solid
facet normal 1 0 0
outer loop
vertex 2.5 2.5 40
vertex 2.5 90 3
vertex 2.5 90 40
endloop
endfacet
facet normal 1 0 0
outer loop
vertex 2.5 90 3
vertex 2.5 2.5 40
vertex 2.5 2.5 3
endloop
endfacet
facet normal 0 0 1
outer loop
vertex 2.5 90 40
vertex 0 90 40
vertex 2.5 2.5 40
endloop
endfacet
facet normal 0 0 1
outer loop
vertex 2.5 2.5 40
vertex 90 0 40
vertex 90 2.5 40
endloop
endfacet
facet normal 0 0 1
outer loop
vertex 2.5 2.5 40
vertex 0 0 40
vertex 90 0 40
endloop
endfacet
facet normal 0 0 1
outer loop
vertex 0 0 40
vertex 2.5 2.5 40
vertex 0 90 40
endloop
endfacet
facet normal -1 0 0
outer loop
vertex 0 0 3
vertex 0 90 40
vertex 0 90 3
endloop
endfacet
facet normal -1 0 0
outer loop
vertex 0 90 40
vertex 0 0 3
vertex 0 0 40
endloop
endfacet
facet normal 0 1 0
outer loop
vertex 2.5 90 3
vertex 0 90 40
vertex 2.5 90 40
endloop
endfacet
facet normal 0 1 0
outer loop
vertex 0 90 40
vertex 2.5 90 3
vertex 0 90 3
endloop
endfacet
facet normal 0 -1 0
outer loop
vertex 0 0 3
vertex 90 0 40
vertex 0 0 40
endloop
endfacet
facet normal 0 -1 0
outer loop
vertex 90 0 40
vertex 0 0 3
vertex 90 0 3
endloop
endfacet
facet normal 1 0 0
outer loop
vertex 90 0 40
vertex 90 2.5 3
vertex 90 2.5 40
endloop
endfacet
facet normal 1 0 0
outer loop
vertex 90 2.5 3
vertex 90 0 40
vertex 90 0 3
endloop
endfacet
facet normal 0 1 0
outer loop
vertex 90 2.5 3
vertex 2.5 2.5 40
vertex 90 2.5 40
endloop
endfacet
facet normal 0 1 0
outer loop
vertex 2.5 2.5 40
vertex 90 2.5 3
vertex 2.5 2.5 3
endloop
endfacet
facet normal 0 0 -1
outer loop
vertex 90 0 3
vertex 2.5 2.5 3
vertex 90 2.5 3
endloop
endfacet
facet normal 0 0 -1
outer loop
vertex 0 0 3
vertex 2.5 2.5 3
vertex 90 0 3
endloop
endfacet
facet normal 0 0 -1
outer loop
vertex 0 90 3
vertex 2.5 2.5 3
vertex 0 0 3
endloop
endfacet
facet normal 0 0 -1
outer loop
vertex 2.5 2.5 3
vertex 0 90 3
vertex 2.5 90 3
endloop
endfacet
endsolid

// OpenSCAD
// Magnetic stirrer housing - an open box (a plate with four walls) that covers a PC case fan
// to turn it into a stir plate. The top plate is the stirring surface. NOVEL general part.
//

top    = 90;
length = 90;
height = 40;
wall   = 2.5;
screw  = 4.5;

$fn = 48;

plate_t = 2;

difference() {
    union() {
        cube([top, length, plate_t]);                                              // top plate
        for (x = [-top/2 - wall, top/2 - wall])
            cube([wall, length, height], p = [x, 0, 0]);                           // left walls
        for (y = [-length/2 - wall, length/2 - wall])
            cube([top, wall, height], p = [0, y, 0]);                              // right walls
    }
    translate([0, 0, -1]) cube([top, length, plate_t + 2]);                        // clear the top surface
    for (x = [-71.5 / 2, 71.5 / 2], y = [-71.5 / 2, 71.5 / 2])
        translate([x, y, -1]) cylinder(h = plate_t + 2, d = screw);                 // screw holes
    // one cable notch in one wall: 12 mm wide, centred along the wall, 8 mm deep from the open edge
    translate([-top / 2 - wall, 0, height - 8]) cube([wall + 12, length, 8]);
}
